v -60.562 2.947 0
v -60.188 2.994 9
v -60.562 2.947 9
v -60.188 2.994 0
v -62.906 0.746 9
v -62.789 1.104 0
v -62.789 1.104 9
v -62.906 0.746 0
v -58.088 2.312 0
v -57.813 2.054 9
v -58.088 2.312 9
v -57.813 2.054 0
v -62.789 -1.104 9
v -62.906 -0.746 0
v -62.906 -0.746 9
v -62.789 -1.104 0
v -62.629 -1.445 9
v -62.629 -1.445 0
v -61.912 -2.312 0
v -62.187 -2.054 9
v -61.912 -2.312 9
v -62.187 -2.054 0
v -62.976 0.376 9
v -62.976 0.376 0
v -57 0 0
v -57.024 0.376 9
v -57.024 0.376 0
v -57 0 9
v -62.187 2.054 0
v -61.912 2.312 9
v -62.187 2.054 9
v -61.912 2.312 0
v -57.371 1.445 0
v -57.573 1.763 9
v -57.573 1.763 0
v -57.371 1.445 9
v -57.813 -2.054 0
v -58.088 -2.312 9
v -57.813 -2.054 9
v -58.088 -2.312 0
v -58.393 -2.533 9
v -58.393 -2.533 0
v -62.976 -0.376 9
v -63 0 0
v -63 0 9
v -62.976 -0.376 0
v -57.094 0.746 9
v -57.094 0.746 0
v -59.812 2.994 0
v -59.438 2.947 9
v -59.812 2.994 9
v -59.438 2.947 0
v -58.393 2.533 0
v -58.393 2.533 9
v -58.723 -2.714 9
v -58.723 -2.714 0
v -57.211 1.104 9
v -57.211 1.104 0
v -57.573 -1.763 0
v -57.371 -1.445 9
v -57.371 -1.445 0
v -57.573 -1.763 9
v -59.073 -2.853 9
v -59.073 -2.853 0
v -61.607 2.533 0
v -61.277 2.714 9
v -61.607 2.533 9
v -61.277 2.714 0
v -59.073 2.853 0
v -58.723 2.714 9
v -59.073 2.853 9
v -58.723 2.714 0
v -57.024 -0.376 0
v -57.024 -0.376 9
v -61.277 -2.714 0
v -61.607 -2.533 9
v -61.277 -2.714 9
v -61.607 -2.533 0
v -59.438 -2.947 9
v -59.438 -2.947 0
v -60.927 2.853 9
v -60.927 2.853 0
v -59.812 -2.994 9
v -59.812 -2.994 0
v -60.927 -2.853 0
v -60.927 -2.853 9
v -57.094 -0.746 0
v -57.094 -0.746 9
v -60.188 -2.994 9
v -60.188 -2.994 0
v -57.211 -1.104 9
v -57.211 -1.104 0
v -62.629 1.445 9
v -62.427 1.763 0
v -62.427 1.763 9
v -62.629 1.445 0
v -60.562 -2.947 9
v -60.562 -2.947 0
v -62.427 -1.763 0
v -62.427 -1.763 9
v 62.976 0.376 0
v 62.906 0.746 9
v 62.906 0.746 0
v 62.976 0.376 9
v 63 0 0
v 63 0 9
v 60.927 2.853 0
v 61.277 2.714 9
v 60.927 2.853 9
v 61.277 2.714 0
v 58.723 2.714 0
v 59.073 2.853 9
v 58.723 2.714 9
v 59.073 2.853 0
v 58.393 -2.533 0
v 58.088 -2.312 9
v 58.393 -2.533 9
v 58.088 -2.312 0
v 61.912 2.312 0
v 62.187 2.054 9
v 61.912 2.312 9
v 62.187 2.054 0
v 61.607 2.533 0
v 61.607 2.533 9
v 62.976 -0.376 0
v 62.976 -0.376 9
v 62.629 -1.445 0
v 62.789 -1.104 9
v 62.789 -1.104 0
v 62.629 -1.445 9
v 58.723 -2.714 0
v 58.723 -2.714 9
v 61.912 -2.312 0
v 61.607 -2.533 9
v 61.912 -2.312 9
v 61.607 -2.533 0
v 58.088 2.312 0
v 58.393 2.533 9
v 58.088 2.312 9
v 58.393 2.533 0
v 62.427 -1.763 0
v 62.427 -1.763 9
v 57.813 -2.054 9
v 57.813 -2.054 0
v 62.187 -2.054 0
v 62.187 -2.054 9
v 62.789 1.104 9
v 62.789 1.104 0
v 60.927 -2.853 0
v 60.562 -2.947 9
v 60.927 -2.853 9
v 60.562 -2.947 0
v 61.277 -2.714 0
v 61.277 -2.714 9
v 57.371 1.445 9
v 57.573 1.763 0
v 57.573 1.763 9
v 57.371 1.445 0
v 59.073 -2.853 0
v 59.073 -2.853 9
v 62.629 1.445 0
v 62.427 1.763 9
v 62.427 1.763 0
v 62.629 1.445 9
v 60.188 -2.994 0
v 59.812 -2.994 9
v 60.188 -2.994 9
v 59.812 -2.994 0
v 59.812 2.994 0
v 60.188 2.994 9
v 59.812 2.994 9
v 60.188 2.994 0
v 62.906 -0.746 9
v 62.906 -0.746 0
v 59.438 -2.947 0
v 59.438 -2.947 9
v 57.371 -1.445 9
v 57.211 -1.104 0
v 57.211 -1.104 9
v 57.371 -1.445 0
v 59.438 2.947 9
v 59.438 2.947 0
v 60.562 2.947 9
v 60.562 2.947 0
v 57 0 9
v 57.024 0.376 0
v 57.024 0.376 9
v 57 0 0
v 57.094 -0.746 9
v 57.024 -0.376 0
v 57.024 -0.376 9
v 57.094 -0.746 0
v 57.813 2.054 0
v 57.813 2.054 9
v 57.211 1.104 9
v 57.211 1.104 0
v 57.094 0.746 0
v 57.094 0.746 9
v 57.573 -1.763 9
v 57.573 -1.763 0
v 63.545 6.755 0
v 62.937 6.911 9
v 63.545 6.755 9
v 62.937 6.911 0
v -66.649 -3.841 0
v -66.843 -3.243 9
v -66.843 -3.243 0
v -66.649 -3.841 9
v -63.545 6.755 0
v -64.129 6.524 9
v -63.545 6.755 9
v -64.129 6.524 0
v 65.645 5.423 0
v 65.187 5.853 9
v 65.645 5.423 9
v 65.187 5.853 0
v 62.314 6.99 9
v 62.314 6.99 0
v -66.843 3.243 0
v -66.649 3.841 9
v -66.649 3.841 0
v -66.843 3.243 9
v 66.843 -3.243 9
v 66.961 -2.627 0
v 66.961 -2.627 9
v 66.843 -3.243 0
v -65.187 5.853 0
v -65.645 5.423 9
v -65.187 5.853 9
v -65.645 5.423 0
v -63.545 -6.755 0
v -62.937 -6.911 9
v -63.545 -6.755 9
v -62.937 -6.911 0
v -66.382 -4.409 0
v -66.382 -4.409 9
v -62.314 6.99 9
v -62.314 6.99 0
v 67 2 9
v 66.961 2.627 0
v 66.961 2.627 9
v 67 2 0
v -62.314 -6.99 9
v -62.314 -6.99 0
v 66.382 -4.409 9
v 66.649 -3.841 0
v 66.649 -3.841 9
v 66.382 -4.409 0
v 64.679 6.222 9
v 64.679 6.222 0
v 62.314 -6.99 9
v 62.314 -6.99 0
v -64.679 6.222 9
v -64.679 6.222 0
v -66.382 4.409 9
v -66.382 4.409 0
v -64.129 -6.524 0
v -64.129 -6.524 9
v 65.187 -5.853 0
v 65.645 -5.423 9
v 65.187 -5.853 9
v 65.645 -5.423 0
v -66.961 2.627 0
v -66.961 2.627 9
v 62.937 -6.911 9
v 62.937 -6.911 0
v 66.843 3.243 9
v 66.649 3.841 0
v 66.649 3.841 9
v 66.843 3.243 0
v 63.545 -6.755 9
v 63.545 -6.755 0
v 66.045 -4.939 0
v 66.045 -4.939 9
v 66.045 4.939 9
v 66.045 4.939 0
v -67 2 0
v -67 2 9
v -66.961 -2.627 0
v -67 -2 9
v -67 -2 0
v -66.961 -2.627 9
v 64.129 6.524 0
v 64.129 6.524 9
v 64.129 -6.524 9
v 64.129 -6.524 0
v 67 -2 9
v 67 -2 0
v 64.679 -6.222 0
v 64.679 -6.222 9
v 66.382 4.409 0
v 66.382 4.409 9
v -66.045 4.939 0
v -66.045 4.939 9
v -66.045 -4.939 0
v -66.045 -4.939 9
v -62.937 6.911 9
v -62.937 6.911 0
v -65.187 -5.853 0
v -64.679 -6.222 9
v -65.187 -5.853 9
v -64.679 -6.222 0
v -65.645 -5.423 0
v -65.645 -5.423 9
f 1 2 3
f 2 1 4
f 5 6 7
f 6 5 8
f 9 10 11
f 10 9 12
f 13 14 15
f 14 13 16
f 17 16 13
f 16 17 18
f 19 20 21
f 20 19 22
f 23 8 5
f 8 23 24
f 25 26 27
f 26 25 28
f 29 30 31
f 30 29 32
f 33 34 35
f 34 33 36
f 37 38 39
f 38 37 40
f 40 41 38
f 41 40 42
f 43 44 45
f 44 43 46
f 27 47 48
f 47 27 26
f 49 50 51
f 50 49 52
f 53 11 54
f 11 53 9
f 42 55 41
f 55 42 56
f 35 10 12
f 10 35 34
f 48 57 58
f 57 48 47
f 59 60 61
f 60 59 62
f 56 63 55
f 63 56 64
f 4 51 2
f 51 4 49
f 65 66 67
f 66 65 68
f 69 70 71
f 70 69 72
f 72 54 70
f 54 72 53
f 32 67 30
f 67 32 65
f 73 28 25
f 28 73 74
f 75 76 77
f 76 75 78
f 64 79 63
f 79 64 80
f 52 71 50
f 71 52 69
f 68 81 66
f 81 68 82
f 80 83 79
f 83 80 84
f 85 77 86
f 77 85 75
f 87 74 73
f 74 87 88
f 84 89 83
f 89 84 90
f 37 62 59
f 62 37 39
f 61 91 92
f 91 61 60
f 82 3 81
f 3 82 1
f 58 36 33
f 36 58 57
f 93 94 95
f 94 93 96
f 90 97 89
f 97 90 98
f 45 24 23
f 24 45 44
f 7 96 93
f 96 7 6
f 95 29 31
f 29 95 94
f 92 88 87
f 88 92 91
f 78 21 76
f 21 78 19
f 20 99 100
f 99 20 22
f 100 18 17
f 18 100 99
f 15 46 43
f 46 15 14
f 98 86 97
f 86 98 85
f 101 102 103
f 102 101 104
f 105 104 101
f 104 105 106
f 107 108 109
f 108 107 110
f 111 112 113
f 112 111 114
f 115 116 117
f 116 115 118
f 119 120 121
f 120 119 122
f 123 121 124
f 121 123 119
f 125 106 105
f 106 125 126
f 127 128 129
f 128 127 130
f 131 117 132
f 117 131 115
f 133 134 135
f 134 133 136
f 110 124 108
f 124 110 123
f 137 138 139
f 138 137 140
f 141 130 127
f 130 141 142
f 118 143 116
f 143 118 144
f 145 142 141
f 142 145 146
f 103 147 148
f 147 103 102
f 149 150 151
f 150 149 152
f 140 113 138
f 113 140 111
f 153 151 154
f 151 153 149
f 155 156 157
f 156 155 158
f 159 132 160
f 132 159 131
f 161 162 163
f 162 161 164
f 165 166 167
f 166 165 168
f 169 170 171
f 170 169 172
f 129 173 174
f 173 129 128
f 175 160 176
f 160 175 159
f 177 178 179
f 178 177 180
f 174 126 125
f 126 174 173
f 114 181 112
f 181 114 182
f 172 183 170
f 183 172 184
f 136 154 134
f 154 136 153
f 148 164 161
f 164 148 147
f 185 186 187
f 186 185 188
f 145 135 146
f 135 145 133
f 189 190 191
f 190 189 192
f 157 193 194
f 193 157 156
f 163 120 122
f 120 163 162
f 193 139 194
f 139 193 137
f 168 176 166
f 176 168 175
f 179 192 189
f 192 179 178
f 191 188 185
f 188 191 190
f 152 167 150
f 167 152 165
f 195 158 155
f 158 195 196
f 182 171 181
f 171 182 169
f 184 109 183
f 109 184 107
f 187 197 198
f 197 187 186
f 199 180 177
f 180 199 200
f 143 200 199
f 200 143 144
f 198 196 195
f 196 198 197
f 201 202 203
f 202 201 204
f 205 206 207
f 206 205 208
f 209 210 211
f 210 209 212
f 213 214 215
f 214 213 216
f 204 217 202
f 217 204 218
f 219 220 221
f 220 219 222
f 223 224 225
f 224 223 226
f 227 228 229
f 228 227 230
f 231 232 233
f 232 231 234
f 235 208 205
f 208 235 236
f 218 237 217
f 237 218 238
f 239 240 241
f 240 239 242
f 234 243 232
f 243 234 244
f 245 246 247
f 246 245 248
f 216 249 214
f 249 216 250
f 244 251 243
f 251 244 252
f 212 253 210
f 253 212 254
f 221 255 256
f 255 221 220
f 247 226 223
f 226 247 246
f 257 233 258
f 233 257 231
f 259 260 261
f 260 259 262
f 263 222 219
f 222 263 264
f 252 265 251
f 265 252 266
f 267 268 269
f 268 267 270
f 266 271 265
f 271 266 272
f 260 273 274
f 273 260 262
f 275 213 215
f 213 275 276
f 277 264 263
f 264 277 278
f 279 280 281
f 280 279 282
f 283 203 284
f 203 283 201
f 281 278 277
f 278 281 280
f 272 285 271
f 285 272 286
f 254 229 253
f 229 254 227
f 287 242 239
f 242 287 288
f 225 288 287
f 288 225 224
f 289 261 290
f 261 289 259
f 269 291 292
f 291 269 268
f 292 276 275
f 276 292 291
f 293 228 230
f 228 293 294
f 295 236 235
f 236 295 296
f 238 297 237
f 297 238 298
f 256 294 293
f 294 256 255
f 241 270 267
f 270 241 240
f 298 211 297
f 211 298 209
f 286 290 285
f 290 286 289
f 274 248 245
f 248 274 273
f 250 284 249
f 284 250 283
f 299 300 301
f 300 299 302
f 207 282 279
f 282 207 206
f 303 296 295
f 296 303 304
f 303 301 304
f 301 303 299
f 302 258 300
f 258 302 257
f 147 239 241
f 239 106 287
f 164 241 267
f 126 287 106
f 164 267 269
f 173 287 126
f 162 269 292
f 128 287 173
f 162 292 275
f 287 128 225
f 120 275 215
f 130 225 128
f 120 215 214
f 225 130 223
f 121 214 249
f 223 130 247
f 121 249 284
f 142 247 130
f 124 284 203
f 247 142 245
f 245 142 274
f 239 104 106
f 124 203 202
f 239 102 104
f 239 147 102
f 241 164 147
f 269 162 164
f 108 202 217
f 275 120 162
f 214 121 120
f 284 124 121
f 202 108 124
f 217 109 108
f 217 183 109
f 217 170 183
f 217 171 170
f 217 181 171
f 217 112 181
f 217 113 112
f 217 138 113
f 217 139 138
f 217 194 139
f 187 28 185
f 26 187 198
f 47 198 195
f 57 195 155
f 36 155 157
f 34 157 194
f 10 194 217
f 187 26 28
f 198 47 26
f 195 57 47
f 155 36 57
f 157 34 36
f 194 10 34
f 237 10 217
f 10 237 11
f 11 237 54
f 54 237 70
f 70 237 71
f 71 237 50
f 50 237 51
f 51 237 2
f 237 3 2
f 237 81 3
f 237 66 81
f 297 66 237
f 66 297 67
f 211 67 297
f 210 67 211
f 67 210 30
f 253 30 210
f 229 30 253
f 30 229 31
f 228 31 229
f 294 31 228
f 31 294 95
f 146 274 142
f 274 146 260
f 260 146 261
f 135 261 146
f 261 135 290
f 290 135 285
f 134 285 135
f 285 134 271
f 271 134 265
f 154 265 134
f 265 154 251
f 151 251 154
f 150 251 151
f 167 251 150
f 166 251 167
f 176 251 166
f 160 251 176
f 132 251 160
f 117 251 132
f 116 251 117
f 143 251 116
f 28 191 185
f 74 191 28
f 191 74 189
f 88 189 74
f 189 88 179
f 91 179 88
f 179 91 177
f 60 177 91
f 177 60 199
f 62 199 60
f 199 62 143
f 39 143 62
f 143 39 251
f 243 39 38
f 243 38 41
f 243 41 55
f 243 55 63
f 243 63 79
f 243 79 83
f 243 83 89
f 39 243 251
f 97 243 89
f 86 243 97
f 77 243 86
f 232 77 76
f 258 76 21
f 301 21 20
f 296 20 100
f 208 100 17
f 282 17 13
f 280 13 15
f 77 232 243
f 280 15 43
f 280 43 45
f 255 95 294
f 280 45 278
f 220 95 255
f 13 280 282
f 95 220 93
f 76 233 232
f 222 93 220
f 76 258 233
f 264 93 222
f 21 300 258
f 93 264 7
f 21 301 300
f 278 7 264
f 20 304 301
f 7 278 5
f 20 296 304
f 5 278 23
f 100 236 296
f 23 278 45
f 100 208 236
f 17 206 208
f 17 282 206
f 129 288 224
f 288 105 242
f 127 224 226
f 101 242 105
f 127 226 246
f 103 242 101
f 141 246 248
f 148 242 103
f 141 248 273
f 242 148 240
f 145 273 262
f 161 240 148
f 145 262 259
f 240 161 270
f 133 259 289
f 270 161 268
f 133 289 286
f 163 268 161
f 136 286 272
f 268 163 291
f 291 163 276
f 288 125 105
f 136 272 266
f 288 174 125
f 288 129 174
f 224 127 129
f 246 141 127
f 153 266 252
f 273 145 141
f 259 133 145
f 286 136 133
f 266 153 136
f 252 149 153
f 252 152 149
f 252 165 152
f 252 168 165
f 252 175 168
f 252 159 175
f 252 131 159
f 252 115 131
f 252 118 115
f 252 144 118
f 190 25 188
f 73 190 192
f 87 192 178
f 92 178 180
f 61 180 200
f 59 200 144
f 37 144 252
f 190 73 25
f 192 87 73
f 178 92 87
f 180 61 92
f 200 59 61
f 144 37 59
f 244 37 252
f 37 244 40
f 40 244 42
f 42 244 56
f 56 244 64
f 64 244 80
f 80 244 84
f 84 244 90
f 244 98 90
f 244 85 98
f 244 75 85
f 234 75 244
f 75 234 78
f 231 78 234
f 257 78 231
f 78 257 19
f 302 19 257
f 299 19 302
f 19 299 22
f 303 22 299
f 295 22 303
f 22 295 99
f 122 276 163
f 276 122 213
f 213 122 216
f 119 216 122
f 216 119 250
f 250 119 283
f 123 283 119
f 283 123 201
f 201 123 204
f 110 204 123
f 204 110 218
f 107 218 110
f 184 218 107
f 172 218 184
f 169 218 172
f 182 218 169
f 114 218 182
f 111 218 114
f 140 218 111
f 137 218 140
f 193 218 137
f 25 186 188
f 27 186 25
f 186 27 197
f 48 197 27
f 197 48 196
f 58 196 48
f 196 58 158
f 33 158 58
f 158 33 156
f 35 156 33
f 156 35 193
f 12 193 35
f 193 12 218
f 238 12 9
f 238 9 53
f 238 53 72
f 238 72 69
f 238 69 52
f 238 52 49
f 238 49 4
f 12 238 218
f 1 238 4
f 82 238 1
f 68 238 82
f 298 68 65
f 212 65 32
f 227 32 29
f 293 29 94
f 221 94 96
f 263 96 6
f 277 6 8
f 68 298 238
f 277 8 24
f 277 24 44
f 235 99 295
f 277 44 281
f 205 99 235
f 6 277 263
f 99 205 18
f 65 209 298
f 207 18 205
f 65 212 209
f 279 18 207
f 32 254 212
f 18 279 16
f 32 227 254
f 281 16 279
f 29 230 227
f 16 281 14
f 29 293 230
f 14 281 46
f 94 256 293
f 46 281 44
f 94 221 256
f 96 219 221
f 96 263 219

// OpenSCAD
$fn = 50;


difference() {
	union() {
		hull() {
			translate(v = [-62.0000000000, 2.0000000000, 0]) {
				cylinder(h = 9, r = 5);
			}
			translate(v = [62.0000000000, 2.0000000000, 0]) {
				cylinder(h = 9, r = 5);
			}
			translate(v = [-62.0000000000, -2.0000000000, 0]) {
				cylinder(h = 9, r = 5);
			}
			translate(v = [62.0000000000, -2.0000000000, 0]) {
				cylinder(h = 9, r = 5);
			}
		}
	}
	union() {
		translate(v = [-60.0000000000, 0.0000000000, -100.0000000000]) {
			cylinder(h = 200, r = 3.0000000000);
		}
		translate(v = [-60.0000000000, 0.0000000000, -100.0000000000]) {
			cylinder(h = 200, r = 3.0000000000);
		}
		translate(v = [60.0000000000, 0.0000000000, -100.0000000000]) {
			cylinder(h = 200, r = 3.0000000000);
		}
		translate(v = [60.0000000000, 0.0000000000, -100.0000000000]) {
			cylinder(h = 200, r = 3.0000000000);
		}
	}
}
